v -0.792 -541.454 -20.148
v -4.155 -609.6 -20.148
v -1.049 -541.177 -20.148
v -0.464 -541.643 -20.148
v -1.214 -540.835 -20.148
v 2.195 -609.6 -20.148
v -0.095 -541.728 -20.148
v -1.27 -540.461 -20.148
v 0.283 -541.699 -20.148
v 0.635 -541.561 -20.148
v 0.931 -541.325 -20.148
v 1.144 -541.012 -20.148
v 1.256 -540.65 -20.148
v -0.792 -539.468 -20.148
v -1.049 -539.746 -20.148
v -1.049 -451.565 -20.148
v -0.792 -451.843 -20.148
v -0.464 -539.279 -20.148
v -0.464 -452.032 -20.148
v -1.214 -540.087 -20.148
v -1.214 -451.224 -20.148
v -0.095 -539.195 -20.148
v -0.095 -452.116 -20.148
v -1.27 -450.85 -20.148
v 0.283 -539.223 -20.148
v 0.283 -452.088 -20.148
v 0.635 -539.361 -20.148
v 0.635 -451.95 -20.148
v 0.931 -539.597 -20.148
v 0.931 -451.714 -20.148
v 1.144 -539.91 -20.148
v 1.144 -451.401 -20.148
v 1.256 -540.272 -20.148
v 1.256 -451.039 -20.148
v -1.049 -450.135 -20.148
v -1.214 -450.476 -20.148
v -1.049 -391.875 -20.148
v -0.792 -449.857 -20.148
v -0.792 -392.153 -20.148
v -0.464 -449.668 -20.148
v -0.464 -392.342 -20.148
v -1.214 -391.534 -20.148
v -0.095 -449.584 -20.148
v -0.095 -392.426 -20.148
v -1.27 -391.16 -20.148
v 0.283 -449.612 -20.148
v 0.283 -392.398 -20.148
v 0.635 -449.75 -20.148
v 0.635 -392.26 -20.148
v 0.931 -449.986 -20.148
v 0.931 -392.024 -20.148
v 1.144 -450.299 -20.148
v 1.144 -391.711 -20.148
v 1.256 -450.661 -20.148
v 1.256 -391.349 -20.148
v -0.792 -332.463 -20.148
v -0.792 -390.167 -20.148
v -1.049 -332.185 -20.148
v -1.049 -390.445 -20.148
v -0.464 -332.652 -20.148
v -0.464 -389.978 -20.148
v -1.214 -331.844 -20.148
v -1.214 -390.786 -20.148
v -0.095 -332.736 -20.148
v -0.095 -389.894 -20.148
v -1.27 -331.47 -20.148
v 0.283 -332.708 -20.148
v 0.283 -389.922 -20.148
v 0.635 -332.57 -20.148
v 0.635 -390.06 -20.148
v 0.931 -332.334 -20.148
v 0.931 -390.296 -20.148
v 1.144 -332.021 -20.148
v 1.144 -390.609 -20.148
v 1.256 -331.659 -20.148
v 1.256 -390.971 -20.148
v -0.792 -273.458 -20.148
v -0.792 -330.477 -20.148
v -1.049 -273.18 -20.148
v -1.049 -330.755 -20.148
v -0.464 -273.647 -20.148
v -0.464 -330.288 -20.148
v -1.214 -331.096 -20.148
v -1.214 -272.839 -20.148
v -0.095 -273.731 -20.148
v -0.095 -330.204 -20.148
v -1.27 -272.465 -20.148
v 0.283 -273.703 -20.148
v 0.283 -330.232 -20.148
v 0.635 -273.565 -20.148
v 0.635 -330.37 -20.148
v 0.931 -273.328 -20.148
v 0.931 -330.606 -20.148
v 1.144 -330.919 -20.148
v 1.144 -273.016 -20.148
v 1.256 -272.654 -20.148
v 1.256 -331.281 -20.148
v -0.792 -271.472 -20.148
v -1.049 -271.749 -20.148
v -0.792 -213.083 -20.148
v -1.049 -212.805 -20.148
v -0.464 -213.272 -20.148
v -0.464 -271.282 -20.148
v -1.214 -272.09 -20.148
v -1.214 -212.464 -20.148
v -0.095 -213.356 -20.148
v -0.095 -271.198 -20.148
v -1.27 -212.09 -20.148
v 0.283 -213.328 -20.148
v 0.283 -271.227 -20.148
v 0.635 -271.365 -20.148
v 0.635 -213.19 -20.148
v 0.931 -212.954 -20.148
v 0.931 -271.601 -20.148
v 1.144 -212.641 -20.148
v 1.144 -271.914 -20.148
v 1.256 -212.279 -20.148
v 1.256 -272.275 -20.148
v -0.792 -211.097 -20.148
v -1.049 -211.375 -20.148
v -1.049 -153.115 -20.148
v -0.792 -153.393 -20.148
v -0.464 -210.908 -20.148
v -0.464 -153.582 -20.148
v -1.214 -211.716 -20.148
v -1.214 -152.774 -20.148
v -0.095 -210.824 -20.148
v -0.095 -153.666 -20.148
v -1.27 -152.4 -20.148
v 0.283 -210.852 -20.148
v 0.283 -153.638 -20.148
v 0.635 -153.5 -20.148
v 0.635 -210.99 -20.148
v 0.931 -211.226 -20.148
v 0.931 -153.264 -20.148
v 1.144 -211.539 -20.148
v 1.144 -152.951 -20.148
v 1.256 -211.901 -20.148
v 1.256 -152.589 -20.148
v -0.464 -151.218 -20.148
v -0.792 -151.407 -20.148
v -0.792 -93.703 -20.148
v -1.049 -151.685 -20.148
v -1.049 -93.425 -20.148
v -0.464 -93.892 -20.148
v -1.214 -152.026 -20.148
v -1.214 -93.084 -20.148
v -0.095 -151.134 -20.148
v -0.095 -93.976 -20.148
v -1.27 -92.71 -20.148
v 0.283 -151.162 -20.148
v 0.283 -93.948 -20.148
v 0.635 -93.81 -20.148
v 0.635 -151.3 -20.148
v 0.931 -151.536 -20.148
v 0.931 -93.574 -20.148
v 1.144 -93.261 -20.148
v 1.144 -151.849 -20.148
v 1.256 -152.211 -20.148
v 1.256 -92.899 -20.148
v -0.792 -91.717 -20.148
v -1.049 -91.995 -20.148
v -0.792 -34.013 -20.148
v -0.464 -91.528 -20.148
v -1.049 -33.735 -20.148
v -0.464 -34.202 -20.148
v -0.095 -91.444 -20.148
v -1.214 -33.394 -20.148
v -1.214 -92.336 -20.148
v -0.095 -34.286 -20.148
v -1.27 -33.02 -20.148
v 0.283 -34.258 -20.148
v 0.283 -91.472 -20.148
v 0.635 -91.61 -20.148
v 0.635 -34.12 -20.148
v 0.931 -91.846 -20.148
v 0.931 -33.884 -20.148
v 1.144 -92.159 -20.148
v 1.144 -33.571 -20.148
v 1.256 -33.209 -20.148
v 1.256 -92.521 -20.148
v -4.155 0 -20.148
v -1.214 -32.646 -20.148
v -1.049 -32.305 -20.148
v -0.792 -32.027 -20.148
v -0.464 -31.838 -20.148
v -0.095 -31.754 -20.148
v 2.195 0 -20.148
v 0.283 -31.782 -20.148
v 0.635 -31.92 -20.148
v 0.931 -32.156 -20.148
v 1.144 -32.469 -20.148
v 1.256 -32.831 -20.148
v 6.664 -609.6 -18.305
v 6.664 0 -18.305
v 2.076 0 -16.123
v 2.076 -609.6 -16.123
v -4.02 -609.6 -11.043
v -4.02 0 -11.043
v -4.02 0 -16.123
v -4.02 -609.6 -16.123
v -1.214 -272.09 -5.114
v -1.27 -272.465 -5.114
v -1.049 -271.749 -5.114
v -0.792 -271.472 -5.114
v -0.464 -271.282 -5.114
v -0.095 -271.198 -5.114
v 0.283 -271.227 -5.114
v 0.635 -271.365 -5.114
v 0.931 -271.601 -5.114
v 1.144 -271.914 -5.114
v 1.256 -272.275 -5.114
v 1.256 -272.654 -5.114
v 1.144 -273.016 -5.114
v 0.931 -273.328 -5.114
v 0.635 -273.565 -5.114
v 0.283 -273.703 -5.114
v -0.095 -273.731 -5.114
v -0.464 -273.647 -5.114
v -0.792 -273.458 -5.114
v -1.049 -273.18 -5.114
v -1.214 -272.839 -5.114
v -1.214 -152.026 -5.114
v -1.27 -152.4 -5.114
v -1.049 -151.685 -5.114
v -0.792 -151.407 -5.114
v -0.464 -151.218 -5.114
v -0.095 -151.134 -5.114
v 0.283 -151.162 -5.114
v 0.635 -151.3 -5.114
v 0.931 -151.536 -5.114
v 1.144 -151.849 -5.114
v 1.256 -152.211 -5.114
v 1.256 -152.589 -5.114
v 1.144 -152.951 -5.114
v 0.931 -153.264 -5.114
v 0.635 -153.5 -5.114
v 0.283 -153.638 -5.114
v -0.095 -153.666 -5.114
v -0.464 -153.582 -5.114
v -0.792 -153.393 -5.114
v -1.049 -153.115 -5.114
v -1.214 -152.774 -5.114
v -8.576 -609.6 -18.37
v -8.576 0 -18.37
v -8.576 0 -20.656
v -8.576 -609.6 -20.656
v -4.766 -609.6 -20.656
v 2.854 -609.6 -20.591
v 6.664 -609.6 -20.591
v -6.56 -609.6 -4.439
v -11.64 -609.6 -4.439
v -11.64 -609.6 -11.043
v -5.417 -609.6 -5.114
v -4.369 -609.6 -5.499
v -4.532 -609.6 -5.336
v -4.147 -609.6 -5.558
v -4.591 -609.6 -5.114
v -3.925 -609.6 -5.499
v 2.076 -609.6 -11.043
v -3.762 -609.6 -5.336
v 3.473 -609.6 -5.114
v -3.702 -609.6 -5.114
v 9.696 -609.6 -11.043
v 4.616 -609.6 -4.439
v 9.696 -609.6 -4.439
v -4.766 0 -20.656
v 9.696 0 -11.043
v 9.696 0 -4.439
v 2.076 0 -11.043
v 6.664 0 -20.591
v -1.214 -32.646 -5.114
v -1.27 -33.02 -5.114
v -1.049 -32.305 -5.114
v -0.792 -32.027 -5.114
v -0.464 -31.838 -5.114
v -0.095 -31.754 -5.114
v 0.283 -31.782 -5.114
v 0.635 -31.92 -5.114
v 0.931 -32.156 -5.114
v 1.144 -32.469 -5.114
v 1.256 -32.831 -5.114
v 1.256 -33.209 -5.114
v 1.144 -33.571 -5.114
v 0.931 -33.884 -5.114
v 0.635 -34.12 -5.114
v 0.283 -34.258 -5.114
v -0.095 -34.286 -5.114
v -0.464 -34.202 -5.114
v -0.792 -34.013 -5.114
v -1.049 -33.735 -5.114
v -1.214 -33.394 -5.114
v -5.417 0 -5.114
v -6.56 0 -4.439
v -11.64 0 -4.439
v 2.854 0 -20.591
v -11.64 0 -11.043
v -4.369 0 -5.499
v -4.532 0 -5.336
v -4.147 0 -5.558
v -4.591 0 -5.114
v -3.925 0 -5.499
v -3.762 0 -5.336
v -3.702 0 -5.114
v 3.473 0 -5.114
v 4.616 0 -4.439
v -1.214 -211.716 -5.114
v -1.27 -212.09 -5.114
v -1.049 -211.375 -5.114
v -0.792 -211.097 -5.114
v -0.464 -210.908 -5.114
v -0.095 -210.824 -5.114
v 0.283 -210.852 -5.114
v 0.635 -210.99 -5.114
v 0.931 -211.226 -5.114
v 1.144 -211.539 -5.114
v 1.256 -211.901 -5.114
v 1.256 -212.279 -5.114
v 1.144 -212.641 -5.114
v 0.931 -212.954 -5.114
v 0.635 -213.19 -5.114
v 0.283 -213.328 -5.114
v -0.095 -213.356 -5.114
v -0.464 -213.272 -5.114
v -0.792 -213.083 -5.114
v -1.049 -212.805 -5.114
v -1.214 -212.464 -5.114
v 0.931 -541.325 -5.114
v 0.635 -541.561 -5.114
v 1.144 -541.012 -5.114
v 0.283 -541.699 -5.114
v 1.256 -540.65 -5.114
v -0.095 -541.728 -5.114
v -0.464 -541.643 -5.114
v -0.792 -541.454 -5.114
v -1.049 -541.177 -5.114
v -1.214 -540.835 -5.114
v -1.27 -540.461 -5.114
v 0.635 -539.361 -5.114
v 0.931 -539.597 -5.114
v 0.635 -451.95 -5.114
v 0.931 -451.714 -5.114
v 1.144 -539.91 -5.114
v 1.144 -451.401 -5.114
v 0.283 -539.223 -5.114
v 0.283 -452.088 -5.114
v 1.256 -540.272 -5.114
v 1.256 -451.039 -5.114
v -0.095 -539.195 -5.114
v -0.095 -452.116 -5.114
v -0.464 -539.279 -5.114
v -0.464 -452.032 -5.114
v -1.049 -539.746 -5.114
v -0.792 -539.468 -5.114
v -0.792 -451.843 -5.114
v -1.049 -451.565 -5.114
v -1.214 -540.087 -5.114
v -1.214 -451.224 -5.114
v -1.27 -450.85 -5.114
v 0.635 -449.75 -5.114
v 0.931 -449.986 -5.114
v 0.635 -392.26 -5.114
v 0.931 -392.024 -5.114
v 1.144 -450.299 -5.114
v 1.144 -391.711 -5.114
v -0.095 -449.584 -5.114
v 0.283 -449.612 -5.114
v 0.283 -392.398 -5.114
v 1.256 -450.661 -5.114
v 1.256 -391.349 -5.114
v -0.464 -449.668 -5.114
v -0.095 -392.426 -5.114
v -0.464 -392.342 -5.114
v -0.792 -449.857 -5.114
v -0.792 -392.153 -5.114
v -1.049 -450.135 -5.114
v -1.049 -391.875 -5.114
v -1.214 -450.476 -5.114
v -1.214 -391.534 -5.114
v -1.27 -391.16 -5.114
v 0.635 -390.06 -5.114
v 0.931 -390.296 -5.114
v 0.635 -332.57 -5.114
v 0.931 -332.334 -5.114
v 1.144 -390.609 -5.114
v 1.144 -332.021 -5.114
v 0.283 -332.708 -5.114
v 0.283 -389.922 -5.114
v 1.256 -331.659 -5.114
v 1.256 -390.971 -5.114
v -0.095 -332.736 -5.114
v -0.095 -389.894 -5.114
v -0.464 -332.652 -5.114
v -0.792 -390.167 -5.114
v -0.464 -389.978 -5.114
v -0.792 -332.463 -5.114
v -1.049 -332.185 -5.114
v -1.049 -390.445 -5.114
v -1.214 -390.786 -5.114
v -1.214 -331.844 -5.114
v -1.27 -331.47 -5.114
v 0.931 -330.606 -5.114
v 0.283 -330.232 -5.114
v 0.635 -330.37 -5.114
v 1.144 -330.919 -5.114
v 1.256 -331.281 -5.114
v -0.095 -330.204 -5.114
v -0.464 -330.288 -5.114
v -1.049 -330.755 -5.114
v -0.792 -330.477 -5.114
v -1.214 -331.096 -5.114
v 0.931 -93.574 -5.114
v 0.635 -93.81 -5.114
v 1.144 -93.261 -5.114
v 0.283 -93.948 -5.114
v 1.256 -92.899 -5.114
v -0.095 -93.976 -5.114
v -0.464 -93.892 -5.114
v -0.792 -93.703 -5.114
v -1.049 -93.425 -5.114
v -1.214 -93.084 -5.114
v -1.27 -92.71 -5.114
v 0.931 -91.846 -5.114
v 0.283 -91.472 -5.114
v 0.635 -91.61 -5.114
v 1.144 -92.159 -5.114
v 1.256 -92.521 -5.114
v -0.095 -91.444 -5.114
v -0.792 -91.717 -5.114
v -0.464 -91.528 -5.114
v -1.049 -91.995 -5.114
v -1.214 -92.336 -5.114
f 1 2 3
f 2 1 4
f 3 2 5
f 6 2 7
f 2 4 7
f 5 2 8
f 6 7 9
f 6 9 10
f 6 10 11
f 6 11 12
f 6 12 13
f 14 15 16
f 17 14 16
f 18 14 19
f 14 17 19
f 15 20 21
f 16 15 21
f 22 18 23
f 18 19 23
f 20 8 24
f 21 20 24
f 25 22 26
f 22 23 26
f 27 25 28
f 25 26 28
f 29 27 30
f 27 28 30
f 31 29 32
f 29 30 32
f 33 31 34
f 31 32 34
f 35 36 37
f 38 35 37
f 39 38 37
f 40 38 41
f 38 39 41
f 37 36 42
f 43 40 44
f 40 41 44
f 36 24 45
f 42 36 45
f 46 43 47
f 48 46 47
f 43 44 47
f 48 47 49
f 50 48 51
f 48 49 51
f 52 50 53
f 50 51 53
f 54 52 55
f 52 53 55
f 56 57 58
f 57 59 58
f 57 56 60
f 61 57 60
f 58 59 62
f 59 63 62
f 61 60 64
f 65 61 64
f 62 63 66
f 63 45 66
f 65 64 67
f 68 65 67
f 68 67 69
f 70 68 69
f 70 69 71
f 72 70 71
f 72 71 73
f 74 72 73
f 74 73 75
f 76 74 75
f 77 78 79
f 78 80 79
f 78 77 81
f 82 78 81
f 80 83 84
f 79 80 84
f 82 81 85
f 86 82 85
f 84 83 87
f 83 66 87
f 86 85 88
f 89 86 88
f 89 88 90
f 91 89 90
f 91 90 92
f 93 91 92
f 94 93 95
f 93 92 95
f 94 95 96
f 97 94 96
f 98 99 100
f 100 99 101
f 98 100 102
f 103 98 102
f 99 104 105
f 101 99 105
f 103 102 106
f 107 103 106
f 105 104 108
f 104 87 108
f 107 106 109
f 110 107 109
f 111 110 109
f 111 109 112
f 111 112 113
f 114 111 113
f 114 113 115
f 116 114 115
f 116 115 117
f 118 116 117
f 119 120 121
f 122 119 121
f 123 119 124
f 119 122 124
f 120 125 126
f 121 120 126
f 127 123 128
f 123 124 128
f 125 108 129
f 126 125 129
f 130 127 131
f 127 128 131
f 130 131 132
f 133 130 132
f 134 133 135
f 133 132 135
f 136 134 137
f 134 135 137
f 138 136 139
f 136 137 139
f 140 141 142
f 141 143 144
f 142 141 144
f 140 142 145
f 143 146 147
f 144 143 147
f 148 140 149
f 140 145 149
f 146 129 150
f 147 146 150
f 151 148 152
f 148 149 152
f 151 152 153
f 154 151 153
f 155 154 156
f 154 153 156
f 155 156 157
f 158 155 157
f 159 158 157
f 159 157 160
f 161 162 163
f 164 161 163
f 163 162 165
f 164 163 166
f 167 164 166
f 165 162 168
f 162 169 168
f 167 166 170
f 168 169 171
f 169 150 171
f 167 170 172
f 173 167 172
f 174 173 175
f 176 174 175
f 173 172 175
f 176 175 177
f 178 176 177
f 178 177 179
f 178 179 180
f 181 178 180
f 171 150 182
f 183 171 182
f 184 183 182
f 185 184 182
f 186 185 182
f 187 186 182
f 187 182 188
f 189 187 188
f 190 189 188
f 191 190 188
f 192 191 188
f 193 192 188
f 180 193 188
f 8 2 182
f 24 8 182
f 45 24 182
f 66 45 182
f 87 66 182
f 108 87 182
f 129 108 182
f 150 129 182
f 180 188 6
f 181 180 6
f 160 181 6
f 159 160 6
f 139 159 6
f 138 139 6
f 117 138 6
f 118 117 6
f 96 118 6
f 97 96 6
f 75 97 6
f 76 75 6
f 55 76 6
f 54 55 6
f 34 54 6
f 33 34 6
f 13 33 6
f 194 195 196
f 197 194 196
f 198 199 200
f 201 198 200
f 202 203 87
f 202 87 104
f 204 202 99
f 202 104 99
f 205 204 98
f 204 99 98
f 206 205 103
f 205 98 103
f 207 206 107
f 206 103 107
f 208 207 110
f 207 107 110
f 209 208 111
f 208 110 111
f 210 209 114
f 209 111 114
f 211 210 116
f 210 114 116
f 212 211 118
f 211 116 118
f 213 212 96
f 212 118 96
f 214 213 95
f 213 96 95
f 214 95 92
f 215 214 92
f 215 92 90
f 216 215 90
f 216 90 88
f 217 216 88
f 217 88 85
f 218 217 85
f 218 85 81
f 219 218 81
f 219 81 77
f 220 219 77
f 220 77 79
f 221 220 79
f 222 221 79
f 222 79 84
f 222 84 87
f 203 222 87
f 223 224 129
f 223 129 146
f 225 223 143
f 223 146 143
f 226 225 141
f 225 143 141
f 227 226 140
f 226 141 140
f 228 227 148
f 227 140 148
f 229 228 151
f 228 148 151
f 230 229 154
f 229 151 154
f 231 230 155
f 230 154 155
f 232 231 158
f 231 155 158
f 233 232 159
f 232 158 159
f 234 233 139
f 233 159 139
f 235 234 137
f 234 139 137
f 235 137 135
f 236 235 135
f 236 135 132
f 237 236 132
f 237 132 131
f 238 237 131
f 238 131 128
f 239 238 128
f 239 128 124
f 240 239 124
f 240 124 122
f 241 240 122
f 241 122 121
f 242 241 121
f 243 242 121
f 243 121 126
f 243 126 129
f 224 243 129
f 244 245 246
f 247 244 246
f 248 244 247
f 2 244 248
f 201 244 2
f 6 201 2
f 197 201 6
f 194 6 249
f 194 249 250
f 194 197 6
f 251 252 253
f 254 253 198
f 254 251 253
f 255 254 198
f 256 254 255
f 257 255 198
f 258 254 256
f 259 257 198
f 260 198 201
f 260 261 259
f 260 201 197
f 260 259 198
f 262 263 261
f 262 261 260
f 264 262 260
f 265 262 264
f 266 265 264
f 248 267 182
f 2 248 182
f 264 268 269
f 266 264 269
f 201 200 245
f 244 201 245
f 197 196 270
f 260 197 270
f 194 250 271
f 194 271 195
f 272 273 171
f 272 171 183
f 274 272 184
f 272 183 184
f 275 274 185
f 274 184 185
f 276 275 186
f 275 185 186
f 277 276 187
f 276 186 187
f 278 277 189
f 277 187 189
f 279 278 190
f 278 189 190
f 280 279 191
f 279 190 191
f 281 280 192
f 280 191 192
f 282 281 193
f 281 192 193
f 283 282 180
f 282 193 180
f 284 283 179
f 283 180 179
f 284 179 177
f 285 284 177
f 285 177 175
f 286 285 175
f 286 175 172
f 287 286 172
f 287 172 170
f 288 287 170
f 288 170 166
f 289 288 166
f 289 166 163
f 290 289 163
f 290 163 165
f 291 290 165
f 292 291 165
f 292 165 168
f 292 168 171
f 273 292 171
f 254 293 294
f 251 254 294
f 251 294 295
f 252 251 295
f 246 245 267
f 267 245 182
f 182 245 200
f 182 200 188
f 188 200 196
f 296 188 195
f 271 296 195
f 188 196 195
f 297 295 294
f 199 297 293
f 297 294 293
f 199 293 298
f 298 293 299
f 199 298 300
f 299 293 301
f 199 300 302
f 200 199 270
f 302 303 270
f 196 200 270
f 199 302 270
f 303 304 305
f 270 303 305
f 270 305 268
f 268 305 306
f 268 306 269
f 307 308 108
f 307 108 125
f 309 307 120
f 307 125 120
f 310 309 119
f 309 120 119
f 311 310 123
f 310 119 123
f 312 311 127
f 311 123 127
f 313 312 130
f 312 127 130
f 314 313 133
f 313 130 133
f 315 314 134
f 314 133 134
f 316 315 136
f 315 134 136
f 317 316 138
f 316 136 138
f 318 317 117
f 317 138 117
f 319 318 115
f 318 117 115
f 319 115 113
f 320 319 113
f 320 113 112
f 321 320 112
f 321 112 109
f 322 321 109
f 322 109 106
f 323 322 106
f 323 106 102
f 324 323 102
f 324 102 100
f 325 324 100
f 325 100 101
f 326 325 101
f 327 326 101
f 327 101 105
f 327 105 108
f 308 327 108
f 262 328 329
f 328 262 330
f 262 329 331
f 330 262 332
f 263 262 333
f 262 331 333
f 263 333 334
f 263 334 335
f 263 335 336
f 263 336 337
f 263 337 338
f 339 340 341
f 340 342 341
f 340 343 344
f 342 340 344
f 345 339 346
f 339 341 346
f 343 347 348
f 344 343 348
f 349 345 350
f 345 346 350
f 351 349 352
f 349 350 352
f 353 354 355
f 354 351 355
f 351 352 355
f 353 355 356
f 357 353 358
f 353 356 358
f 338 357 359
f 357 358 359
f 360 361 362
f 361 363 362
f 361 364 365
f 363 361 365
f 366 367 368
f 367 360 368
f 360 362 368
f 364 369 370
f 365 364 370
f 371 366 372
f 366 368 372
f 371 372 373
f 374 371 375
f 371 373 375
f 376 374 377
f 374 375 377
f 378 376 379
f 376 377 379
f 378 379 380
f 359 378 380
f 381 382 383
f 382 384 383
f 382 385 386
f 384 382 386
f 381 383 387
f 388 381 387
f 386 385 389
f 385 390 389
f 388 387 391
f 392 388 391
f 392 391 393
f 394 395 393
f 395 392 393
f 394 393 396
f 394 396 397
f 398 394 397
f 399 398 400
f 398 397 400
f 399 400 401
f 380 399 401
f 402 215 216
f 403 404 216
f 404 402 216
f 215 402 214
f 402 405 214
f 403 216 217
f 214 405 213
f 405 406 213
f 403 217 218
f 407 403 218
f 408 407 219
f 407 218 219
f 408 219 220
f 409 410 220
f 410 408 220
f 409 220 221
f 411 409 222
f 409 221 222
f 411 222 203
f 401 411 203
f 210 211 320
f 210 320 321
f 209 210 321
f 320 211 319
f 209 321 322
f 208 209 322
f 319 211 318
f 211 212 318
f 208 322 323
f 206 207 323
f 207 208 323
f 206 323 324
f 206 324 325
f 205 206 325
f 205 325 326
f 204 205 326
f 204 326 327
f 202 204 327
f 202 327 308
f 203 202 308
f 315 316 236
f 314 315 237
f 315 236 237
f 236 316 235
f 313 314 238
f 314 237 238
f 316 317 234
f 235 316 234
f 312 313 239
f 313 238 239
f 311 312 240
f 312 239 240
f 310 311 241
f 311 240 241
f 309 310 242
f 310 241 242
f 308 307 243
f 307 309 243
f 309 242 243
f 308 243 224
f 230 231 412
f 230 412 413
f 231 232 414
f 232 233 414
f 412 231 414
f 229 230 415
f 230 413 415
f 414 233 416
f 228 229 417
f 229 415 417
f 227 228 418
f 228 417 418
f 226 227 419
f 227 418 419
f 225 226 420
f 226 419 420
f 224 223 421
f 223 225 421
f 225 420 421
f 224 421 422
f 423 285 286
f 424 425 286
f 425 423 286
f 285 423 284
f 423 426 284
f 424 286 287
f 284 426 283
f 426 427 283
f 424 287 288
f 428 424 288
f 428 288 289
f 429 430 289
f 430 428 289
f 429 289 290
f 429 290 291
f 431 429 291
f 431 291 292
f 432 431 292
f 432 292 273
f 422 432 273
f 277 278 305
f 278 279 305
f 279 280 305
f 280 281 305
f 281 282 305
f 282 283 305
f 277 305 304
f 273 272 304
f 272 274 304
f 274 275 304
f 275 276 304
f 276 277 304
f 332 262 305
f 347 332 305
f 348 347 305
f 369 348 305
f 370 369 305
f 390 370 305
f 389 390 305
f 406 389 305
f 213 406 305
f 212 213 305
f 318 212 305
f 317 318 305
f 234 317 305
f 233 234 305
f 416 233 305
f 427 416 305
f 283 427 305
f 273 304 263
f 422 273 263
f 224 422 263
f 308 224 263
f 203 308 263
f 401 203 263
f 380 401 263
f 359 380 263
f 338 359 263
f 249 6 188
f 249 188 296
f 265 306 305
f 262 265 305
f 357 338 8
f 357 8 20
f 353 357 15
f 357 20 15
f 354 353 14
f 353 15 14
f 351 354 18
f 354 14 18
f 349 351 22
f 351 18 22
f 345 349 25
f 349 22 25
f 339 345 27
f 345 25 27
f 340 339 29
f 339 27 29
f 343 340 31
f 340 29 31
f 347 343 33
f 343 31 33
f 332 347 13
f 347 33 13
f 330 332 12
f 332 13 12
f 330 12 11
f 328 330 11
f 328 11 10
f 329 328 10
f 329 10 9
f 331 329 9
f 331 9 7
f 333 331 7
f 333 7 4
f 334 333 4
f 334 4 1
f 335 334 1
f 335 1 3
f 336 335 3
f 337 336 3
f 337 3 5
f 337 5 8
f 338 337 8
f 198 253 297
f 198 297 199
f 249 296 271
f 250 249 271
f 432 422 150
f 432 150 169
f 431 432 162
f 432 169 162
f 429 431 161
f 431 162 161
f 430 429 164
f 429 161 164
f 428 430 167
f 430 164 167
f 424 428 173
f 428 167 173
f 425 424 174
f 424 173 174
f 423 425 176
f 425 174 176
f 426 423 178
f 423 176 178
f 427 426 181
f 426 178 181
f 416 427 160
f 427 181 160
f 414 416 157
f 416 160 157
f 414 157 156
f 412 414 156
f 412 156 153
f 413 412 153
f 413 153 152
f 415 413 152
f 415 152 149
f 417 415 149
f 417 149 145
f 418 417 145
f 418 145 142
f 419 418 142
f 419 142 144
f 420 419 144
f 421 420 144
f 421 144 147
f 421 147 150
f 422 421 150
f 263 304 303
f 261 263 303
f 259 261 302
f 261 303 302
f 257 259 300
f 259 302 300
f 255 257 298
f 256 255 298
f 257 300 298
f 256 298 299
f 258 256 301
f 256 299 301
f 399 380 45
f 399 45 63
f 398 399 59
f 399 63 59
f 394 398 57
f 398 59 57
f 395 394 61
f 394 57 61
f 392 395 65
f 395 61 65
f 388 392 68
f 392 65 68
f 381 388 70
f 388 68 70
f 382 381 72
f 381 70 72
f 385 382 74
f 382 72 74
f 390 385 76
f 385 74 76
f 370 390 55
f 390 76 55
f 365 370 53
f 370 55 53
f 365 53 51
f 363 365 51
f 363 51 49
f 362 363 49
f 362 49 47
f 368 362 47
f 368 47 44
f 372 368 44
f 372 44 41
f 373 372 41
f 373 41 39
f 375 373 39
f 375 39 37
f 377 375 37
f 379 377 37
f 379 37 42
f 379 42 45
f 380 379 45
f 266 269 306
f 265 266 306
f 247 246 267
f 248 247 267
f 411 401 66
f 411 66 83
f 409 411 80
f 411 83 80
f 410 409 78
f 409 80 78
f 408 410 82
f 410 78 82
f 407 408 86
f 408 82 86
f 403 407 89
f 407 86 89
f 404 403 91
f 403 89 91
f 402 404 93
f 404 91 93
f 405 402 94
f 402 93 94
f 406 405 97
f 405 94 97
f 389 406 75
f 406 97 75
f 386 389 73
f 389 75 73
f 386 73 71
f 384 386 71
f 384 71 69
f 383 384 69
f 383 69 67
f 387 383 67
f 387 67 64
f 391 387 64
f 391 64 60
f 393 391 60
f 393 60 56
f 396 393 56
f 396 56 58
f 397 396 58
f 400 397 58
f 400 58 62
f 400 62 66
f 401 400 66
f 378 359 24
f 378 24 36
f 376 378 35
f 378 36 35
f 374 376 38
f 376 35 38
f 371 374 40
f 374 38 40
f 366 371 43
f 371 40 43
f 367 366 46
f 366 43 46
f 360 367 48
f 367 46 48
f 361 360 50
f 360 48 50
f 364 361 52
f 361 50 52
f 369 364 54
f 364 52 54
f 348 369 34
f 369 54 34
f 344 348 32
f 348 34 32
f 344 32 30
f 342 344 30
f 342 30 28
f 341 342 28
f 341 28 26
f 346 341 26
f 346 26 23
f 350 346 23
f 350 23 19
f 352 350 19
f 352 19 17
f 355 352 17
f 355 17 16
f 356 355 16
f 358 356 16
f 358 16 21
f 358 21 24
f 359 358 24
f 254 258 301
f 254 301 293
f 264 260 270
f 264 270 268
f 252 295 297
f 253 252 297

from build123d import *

# Parameters (mm, degrees)
F1_DEPTH = 609.6
F3_D     = 2.54


with BuildPart() as f1:
    # F0 (on Front) → F1 (new body)
    with BuildSketch(Plane.XZ):
        with BuildLine():
            Line((-6.559787, -4.439499), (-11.639787, -4.439499))
            Line((-11.639787, -4.439499), (-11.639787, -11.043499))
            Line((-11.639787, -11.043499), (-4.019787, -11.043499))
            Line((-4.019787, -11.043499), (-4.019787, -16.123499))
            Line((-4.019787, -16.123499), (-8.575975, -18.370174))
            Line((-8.575975, -18.370174), (-8.575975, -20.656174))
            Line((-8.575975, -20.656174), (-4.765975, -20.656174))
            Line((-4.765975, -20.656174), (-4.155417, -20.148174))
            Line((-4.155417, -20.148174), (2.194583, -20.148174))
            Line((2.194583, -20.148174), (2.854025, -20.59087))
            Line((2.854025, -20.59087), (6.664025, -20.59087))
            Line((6.664025, -20.59087), (6.664025, -18.30487))
            Line((6.664025, -18.30487), (2.076213, -16.123499))
            Line((2.076213, -16.123499), (2.076213, -11.043499))
            Line((2.076213, -11.043499), (9.696213, -11.043499))
            Line((9.696213, -11.043499), (9.696213, -4.439499))
            Line((9.696213, -4.439499), (4.616213, -4.439499))
            Line((4.616213, -4.439499), (3.473213, -5.113759))
            Line((3.473213, -5.113759), (-3.702287, -5.113759))
            ThreePointArc((-3.702287, -5.113759), (-4.146787, -5.558259), (-4.591287, -5.113759))
            Line((-4.591287, -5.113759), (-5.416787, -5.113759))
            Line((-5.416787, -5.113759), (-6.559787, -4.439499))
        make_face()
    extrude(amount=F1_DEPTH)

    # F3 (through all)
    with Locations(Plane.XY.offset(-5.113759)):
        with Locations((0, -33.02), (0, -92.71), (0, -152.4), (0, -212.09), (0, -272.464672), (0, -331.47), (0, -391.16), (0, -450.85), (0, -540.461149)):
            Hole(F3_D / 2)


solid = f1.part
